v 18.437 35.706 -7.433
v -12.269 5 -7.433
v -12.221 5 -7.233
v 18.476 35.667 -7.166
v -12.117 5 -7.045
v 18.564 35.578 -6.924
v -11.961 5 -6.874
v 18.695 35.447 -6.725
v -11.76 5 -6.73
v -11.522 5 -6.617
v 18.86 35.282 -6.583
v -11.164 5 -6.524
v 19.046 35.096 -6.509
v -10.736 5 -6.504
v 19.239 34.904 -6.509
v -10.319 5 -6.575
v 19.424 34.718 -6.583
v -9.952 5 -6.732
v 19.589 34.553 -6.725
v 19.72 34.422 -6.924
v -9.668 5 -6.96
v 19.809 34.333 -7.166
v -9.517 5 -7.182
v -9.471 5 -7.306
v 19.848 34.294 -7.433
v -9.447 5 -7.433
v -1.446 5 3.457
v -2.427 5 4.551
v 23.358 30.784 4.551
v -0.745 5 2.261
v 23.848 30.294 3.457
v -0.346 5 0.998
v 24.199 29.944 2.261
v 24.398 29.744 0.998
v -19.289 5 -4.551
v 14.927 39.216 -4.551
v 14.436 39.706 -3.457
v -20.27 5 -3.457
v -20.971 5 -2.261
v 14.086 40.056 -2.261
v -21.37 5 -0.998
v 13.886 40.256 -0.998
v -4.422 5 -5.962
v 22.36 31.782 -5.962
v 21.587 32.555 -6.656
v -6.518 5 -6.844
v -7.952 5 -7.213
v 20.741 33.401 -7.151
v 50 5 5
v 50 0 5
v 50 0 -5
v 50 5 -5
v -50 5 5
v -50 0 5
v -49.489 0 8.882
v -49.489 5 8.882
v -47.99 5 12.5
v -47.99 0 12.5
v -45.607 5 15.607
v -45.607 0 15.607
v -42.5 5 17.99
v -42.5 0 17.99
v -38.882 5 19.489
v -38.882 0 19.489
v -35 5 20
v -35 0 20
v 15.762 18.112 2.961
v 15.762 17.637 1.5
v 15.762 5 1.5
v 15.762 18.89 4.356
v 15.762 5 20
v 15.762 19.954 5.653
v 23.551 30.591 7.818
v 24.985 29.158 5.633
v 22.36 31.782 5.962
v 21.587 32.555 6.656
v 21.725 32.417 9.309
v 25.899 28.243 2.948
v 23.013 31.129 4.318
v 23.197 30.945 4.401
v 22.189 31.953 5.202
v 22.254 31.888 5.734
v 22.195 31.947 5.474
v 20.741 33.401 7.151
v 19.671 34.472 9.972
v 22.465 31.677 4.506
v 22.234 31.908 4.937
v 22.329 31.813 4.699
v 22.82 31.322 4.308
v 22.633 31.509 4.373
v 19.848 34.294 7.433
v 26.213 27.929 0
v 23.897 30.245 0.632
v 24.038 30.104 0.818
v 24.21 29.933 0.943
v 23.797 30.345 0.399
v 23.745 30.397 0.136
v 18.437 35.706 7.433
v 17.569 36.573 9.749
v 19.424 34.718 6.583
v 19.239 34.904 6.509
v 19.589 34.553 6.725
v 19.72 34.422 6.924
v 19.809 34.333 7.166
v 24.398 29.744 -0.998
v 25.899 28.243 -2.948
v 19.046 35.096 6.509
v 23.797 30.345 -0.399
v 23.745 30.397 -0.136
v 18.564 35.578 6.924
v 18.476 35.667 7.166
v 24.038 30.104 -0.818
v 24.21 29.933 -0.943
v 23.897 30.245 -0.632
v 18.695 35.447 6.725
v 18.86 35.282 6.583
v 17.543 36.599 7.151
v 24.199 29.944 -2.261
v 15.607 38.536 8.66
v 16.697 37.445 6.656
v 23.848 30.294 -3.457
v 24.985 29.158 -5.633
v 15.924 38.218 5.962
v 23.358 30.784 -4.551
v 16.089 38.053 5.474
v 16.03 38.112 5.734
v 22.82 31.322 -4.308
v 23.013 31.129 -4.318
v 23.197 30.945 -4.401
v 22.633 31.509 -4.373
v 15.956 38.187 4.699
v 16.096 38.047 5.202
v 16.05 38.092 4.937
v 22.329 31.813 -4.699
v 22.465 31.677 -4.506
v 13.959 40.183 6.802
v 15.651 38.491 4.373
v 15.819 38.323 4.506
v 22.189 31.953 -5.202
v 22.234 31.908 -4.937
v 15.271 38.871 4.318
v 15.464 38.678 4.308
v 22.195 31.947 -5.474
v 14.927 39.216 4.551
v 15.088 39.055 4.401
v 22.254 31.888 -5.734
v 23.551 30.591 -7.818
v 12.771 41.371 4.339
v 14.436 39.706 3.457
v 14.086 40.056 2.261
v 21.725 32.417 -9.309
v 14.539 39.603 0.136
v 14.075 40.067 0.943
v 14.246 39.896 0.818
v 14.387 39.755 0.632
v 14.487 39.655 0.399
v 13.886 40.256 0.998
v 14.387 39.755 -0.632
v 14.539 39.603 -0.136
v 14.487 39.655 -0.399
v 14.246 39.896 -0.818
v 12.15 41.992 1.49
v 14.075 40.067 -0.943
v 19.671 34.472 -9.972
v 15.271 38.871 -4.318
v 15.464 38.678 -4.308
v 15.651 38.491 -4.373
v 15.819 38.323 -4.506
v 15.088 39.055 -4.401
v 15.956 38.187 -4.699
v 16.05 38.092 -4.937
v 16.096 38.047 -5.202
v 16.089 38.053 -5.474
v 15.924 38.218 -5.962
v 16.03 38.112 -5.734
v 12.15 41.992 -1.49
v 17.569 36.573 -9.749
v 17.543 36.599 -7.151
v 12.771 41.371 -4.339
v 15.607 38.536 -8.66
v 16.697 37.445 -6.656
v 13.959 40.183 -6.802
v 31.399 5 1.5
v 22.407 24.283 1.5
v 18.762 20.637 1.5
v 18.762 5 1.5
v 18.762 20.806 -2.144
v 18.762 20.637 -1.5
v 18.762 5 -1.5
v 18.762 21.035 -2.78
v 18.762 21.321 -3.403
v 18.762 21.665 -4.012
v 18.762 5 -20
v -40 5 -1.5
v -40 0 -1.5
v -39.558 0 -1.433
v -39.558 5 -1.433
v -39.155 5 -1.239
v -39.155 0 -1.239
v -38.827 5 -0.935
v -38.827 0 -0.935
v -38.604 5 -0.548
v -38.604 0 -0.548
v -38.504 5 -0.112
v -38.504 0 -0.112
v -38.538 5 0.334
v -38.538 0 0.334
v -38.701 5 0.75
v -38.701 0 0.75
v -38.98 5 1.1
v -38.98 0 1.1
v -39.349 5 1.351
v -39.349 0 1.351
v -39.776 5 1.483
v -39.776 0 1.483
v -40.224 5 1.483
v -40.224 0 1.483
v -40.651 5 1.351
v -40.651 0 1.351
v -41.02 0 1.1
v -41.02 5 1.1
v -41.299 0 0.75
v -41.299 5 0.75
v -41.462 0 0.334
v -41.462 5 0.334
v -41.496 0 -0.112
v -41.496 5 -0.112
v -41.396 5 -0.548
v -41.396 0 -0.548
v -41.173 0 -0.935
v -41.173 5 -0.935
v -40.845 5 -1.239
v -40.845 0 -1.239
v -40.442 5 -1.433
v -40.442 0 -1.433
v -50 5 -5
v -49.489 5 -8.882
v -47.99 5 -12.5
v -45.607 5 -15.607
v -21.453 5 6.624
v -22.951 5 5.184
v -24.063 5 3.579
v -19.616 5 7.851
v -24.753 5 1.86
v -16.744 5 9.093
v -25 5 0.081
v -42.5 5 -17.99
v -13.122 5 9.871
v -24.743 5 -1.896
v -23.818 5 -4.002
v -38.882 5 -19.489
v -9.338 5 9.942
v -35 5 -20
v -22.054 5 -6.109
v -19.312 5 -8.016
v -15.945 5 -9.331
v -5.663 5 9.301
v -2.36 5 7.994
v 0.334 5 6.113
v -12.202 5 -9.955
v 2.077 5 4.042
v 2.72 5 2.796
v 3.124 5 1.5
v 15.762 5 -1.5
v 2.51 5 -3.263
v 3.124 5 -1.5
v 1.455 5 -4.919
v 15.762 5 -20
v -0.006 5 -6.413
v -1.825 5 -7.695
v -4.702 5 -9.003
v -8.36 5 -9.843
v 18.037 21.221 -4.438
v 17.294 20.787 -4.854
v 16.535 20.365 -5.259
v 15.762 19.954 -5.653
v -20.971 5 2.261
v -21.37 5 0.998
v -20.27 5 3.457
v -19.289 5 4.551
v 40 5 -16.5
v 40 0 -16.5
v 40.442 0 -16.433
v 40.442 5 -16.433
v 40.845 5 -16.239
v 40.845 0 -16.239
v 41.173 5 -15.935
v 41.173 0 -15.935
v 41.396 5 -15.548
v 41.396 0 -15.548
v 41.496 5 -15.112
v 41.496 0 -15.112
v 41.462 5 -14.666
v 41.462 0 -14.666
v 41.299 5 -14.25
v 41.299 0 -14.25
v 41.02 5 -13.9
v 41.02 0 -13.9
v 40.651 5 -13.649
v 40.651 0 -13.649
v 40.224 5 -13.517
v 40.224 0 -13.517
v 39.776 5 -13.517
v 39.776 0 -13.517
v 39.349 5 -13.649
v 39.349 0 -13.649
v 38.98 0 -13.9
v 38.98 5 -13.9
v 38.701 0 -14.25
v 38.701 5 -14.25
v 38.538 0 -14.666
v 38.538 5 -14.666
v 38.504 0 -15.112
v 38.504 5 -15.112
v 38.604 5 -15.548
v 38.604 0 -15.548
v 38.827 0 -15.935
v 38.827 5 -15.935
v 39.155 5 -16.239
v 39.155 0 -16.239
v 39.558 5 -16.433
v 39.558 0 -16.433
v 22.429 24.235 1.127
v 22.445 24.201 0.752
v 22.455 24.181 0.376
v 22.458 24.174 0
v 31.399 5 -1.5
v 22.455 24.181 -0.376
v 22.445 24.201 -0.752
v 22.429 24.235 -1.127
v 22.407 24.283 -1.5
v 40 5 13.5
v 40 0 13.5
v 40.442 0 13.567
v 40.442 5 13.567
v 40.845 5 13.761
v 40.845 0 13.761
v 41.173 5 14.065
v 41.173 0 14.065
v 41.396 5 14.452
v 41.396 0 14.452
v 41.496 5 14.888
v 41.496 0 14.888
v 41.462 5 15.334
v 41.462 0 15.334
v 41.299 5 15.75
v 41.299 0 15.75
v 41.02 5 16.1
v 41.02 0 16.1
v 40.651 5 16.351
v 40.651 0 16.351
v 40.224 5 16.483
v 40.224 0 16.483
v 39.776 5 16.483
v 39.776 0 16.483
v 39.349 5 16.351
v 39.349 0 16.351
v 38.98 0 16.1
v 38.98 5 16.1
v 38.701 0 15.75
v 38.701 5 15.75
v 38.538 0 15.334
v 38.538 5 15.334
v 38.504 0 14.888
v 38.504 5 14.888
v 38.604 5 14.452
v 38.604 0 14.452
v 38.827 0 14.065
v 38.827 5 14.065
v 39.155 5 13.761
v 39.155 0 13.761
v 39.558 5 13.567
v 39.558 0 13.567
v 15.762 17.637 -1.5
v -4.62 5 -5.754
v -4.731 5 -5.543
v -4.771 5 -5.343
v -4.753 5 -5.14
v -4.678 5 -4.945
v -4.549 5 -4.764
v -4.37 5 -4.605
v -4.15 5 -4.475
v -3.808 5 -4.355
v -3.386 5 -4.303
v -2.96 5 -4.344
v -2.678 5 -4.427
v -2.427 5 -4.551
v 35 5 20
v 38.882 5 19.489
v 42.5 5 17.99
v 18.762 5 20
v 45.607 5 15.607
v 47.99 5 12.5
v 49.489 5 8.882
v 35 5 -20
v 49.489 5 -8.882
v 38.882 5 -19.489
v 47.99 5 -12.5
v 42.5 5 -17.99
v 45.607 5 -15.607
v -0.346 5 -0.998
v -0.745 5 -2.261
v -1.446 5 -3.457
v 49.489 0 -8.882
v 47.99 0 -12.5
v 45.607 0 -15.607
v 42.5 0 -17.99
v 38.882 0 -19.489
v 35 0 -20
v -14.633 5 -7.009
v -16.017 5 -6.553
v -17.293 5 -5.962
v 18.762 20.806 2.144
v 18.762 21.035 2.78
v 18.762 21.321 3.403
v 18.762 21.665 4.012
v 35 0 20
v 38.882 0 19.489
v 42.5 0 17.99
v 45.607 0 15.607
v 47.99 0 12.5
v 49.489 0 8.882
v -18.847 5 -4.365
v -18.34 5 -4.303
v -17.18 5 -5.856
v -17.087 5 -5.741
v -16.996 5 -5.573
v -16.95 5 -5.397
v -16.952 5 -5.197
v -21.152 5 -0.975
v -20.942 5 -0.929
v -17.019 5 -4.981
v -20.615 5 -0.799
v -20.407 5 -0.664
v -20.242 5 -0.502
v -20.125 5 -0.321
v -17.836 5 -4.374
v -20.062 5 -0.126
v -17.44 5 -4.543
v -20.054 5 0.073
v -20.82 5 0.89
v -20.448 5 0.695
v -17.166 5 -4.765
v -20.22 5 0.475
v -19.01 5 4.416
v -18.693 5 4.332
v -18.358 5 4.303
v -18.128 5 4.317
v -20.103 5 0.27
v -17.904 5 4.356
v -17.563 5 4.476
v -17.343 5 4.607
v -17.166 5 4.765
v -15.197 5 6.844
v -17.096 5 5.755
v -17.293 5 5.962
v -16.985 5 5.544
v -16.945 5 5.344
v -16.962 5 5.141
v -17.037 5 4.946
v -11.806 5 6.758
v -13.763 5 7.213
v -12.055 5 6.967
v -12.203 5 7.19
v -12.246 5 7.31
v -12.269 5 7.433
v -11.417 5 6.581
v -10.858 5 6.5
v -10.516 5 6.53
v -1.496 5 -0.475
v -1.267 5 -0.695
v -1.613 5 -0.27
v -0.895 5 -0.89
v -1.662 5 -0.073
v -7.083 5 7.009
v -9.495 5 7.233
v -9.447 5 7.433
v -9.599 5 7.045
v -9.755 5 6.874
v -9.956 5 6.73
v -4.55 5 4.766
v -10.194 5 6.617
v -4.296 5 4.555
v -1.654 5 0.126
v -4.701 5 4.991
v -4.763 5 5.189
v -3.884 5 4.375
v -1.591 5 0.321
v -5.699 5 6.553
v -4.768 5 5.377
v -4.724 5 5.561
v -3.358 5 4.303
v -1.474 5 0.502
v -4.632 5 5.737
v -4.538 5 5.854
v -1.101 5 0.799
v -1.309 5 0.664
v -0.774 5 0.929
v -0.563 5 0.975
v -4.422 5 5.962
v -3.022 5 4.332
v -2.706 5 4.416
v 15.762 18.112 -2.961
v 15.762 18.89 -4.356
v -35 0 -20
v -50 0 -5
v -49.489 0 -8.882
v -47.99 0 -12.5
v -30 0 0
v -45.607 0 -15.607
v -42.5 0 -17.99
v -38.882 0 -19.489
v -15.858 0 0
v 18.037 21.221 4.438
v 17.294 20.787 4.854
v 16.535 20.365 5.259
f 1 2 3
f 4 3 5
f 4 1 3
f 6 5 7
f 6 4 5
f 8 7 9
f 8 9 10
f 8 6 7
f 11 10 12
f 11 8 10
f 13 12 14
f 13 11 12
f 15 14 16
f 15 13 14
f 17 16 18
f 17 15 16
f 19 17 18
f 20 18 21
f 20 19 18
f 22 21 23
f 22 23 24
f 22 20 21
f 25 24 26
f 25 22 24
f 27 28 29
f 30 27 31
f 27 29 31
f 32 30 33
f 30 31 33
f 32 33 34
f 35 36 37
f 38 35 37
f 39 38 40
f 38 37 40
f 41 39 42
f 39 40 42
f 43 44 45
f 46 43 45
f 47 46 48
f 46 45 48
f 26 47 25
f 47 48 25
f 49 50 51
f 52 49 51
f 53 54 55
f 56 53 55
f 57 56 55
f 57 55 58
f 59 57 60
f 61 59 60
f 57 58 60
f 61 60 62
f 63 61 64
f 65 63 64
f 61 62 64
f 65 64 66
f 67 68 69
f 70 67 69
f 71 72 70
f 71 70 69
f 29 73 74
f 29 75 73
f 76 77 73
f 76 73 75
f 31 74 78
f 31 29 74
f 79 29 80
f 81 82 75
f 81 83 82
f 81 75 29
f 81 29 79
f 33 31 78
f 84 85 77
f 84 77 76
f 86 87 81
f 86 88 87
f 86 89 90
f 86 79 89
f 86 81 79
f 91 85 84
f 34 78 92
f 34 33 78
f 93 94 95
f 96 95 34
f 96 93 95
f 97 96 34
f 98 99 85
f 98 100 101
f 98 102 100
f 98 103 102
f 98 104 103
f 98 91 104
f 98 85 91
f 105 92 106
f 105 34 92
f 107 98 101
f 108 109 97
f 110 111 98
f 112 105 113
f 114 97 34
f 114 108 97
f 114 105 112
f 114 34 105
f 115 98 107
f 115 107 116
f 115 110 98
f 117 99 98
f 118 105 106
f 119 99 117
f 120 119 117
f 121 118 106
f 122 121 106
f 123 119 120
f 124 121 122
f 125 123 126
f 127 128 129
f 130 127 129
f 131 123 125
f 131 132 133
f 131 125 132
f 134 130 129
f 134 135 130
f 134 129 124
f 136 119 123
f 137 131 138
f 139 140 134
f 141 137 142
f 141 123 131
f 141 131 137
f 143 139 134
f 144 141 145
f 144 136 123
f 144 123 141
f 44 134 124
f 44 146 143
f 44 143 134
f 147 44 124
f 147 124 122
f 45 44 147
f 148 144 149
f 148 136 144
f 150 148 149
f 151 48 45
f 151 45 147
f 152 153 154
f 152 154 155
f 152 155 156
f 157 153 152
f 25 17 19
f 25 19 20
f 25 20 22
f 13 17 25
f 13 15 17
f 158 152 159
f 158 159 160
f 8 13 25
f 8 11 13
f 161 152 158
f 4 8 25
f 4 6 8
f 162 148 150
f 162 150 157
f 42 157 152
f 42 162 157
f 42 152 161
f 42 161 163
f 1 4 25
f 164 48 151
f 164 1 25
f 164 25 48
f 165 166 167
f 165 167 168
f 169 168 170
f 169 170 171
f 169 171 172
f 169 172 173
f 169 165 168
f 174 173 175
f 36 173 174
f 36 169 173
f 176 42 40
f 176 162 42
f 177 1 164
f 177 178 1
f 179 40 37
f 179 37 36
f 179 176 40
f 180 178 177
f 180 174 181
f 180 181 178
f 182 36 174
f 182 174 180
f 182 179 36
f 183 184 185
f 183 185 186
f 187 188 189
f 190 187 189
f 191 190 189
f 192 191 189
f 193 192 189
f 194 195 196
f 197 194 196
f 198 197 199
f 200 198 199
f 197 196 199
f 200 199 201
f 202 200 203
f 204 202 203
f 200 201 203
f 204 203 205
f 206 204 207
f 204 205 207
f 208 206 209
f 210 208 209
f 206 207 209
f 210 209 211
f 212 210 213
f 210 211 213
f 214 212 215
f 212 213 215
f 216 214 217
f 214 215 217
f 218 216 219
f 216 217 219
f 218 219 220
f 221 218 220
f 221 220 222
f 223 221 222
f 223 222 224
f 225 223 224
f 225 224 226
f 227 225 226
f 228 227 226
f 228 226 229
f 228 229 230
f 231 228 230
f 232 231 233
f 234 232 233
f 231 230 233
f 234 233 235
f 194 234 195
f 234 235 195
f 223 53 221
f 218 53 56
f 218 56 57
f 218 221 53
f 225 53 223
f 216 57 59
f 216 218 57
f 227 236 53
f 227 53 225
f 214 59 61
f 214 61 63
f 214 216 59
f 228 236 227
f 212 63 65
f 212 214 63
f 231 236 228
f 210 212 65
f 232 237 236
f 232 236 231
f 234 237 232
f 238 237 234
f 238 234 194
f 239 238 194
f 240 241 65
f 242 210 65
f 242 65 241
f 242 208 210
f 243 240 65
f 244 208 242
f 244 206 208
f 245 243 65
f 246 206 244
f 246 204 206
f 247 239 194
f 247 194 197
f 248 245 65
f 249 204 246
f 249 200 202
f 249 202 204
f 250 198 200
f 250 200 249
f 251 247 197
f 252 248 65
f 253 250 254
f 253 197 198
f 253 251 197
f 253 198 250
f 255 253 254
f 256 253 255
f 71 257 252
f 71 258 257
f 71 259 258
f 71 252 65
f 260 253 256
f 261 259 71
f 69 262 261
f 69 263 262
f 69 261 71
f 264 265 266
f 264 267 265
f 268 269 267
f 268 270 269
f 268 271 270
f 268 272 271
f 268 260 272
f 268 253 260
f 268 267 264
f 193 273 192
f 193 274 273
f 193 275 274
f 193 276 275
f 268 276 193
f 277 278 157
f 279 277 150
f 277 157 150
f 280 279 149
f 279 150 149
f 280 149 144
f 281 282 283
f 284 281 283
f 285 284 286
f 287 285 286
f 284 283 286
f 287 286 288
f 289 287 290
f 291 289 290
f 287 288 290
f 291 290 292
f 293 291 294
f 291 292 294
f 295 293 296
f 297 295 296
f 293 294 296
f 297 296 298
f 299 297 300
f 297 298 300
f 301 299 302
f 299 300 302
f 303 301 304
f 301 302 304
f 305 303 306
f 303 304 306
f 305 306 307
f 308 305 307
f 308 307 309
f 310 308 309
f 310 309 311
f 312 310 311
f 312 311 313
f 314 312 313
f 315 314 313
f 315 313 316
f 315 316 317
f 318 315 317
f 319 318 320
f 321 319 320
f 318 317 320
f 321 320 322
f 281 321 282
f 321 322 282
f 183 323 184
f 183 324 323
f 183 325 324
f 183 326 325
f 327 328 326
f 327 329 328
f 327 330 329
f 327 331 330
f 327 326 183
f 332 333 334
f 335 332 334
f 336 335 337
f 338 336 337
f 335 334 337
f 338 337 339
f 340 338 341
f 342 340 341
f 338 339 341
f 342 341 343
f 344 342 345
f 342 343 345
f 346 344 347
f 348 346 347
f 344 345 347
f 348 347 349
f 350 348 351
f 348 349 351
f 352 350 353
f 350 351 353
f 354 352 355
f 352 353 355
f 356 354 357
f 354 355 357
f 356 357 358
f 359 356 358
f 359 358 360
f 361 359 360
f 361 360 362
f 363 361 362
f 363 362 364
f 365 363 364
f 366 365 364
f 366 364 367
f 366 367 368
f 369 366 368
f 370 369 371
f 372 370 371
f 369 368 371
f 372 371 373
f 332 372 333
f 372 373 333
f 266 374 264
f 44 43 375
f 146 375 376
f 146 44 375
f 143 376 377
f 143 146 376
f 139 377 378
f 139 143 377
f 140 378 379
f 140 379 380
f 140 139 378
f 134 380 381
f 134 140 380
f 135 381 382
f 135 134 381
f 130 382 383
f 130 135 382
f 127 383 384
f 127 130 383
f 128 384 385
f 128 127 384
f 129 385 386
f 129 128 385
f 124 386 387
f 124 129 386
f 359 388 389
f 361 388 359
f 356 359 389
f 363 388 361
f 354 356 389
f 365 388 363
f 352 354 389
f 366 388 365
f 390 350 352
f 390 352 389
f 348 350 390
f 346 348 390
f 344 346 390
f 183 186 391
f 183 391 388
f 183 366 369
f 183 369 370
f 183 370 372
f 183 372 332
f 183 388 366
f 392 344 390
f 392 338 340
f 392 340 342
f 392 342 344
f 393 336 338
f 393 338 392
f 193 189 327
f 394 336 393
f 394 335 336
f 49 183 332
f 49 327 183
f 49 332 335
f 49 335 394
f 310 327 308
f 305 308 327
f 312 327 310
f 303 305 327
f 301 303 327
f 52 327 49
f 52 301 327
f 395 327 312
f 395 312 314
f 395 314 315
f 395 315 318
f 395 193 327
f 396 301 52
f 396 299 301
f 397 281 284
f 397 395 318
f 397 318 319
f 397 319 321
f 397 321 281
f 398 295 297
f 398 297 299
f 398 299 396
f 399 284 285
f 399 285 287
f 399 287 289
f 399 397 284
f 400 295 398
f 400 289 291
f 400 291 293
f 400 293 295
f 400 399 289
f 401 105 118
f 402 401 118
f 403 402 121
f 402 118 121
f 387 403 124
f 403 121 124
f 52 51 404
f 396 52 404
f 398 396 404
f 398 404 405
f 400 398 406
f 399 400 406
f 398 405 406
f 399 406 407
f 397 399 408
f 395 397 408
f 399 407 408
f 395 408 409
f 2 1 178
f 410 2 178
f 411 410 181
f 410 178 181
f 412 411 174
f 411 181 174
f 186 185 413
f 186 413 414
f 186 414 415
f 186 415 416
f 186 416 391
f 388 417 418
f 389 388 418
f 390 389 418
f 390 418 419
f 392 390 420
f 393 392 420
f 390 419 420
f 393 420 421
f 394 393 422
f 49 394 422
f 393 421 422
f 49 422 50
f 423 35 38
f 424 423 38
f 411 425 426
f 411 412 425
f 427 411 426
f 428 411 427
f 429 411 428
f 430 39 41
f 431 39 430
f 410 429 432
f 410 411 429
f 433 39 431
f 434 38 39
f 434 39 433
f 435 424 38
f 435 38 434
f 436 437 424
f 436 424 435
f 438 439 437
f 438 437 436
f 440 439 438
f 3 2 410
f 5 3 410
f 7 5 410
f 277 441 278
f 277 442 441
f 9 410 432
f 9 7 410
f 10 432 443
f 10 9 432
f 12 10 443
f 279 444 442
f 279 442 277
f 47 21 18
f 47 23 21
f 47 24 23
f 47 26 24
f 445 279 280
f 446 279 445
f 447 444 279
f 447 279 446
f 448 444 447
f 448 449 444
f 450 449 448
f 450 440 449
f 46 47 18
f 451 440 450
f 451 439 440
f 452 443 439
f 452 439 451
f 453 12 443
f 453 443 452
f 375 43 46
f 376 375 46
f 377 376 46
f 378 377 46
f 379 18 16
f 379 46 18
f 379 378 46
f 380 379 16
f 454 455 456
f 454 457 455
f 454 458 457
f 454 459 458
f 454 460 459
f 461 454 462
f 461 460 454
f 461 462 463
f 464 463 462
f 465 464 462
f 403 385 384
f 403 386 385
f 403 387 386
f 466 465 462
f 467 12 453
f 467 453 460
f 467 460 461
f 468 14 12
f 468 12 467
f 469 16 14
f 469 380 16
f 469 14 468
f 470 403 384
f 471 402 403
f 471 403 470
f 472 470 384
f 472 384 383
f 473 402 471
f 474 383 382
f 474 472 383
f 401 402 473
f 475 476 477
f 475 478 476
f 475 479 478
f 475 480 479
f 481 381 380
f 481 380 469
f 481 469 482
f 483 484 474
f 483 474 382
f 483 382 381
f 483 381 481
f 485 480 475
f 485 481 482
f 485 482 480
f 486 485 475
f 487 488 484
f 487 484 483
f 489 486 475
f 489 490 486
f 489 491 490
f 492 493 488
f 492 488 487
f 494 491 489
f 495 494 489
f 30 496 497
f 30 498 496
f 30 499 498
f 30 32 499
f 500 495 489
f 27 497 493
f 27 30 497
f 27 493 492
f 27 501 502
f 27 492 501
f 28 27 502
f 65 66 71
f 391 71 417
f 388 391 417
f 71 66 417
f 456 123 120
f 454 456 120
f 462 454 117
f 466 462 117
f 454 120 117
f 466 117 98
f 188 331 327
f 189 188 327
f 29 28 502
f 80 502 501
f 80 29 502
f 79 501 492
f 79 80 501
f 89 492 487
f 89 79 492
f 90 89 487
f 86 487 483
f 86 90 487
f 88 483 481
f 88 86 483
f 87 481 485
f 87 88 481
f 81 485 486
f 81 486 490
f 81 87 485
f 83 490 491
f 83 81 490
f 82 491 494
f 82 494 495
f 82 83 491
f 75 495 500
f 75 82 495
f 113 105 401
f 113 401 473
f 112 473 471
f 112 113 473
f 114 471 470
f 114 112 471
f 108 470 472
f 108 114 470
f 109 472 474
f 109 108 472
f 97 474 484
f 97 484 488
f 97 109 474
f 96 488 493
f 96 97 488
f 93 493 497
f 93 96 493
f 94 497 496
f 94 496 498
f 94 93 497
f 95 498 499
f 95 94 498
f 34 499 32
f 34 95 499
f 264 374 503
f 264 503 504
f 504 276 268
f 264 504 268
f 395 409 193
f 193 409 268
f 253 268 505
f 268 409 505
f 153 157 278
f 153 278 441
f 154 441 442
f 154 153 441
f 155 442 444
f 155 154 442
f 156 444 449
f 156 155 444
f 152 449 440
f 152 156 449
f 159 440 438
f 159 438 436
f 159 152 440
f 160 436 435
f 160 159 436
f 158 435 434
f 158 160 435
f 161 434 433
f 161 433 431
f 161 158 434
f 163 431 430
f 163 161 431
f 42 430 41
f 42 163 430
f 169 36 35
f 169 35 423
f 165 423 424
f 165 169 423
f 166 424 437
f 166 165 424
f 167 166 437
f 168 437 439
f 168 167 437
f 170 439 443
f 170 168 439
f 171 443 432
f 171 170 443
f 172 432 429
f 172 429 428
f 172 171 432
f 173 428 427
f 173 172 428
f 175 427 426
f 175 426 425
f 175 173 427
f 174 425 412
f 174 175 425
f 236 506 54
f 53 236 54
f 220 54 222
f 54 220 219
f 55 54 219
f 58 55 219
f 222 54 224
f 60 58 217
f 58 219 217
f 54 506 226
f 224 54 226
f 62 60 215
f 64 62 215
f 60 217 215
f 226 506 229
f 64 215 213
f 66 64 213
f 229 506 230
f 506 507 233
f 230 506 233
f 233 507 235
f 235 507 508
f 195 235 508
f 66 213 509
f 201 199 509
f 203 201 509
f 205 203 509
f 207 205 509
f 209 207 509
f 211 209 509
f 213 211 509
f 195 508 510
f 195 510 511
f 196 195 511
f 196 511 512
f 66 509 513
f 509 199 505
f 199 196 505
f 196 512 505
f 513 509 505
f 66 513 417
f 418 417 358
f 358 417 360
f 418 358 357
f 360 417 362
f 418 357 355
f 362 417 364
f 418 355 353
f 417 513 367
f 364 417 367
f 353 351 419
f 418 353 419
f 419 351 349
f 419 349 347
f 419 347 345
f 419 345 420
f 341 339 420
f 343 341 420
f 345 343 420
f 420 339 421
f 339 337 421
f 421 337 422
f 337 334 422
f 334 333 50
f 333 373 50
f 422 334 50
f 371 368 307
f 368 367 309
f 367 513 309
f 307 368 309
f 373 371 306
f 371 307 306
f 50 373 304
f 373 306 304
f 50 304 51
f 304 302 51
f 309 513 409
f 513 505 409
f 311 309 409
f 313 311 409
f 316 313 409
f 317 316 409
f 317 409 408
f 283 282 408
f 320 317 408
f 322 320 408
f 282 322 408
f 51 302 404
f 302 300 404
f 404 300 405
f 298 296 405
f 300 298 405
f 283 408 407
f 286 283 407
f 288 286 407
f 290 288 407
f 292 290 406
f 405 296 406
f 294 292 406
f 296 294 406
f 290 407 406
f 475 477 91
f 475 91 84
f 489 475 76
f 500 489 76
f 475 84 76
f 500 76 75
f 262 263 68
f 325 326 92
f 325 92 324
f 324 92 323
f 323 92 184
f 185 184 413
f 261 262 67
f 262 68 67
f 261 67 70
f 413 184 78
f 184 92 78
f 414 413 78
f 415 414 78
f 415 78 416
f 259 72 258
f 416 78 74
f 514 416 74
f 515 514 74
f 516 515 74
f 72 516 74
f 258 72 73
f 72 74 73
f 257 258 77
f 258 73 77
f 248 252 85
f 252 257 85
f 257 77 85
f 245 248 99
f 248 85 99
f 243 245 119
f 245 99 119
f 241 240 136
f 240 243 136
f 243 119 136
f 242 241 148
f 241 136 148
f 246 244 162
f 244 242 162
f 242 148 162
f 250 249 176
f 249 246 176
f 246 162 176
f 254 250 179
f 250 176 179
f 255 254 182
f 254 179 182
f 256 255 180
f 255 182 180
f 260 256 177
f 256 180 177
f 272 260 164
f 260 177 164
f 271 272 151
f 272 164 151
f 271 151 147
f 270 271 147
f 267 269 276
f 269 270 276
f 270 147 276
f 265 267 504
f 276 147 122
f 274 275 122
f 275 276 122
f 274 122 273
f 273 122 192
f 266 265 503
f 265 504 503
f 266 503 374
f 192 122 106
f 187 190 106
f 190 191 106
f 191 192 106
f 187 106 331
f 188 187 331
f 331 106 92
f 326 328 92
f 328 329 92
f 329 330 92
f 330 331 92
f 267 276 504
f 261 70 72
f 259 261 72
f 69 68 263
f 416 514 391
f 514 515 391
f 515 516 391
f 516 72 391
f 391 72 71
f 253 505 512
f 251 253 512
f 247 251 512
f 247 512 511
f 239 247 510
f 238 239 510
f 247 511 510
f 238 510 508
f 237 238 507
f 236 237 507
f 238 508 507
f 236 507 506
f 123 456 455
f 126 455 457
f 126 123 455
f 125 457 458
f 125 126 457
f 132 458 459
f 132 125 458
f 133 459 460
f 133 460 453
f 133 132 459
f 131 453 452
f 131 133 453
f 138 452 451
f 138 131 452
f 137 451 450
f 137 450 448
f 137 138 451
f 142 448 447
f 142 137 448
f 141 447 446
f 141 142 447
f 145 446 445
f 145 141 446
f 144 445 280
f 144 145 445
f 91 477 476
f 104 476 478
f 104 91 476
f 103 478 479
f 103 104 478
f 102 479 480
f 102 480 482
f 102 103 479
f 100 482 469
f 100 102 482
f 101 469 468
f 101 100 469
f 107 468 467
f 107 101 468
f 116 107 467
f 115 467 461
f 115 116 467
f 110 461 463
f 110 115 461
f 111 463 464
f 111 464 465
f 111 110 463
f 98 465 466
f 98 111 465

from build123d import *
from build123d.topology import SkipClean

# Parameters (mm, degrees)
BOSS_EXTRUDE1_DEPTH = 5
SKETCH3_W           = 36.405926788
SKETCH3_H           = 27.783470444
CUT_EXTRUDE1_DEPTH  = 36
CUT_EXTRUDE2_REACH  = 86.1
SKETCH4_R           = 7.5
BOSS_EXTRUDE2_REACH = 86.1
SKETCH5_R           = 1
RIB2_REACH          = 70.337
SKETCH6_WALL_W      = 155.225095754
SKETCH6_WALL_H      = 3
RIB3_REACH          = 83.817
SKETCH7_WALL_W      = 192.357197592
SKETCH7_WALL_H      = 3
RIB4_REACH          = 83.817
SKETCH9_WALL_W      = 192.357197592
SKETCH9_WALL_H      = 3
SKETCH10_R          = 1.5
CUT_EXTRUDE3_DEPTH  = 5


with BuildPart() as part:
    # Sketch1 → Boss-Extrude1 (new body)
    with BuildSketch(Plane(origin=(0, 0, 0), x_dir=(1, 0, 0), z_dir=(0, 1, 0))):
        with BuildLine():
            Line((35, 20), (-35, 20))
            ThreePointArc((-35, 20), (-45.606601718, 15.606601718), (-50, 5))
            Line((-50, 5), (-50, -5))
            ThreePointArc((-50, -5), (-45.606601718, -15.606601718), (-35, -20))
            Line((-35, -20), (35, -20))
            ThreePointArc((35, -20), (45.606601718, -15.606601718), (50, -5))
            Line((50, -5), (50, 5))
            ThreePointArc((50, 5), (45.606601718, 15.606601718), (35, 20))
        make_face()
    extrude(amount=BOSS_EXTRUDE1_DEPTH)

    # Sketch2 → Revolve2 (revolve)
    with SkipClean():  # the faces are left unmerged after this step: merging them gives an invalid solid
        with BuildSketch(Plane.XY, mode=Mode.PRIVATE) as revolve2_sk:
            Polygon((-30, 0), (12.071067812, 42.071067812), (19.142135624, 35), (-15.857864376, 0), align=None)
        revolve(revolve2_sk.sketch.rotate(Axis((19.142135624, 35, 0), (-0.7071067811865515, -0.7071067811865436, 0)), 180), axis=Axis((19.142135624, 35, 0), (-0.7071067811865515, -0.7071067811865436, 0)))

    # Sketch3 → Cut-Extrude1 (cut)
    with BuildSketch(Plane.XZ):
        with Locations((-14.157860418, 0)):
            Rectangle(SKETCH3_W, SKETCH3_H)
    extrude(amount=CUT_EXTRUDE1_DEPTH, mode=Mode.SUBTRACT)

    # Cut-Extrude2: up to this plane
    cut_extrude2_end = Plane(origin=(-35, 5, -5), z_dir=(0, 1, 0))
    # Sketch4 → Cut-Extrude2 (cut, up to the surface)
    with BuildSketch(Plane(origin=(27.071067812, 27.071067812, 0), x_dir=(0, 0, -1), z_dir=(0.7071067811865513, 0.7071067811865438, 0)), mode=Mode.PRIVATE) as cut_extrude2_sk1:
        with Locations(Location((0, 11.213203436, 0), (0, 0, 90))):
            Circle(SKETCH4_R)
    cut_extrude2_tool1 = split(extrude(cut_extrude2_sk1.sketch, amount=-CUT_EXTRUDE2_REACH, mode=Mode.PRIVATE), bisect_by=cut_extrude2_end, keep=Keep.BOTH, mode=Mode.PRIVATE)
    add(cut_extrude2_tool1.solids().sort_by_distance((19.142136, 35, 0))[0], mode=Mode.SUBTRACT)

    # Boss-Extrude2: up to this plane
    boss_extrude2_end = Plane(origin=(-35, 5, -5), z_dir=(0, 1, 0))
    # Sketch5 → Boss-Extrude2 (add, up to the surface)
    with BuildSketch(Plane(origin=(27.071067812, 27.071067812, 0), x_dir=(0, 0, -1), z_dir=(0.7071067811865513, 0.7071067811865438, 0)), mode=Mode.PRIVATE) as boss_extrude2_sk1:
        with Locations((7.5, 11.213203436)):
            Circle(SKETCH5_R)
    boss_extrude2_tool1 = split(extrude(boss_extrude2_sk1.sketch, amount=-BOSS_EXTRUDE2_REACH, mode=Mode.PRIVATE), bisect_by=boss_extrude2_end, keep=Keep.BOTH, mode=Mode.PRIVATE)
    add(boss_extrude2_tool1.solids().sort_by_distance((19.142136, 35, -7.5))[0])
    # Sketch5 → Boss-Extrude2 (add, up to the surface)
    with BuildSketch(Plane(origin=(27.071067812, 27.071067812, 0), x_dir=(0, 0, -1), z_dir=(0.7071067811865513, 0.7071067811865438, 0)), mode=Mode.PRIVATE) as boss_extrude2_sk2:
        with Locations((5.303300859, 5.909902577)):
            Circle(SKETCH5_R)
    boss_extrude2_tool2 = split(extrude(boss_extrude2_sk2.sketch, amount=-BOSS_EXTRUDE2_REACH, mode=Mode.PRIVATE), bisect_by=boss_extrude2_end, keep=Keep.BOTH, mode=Mode.PRIVATE)
    add(boss_extrude2_tool2.solids().sort_by_distance((22.892136, 31.25, -5.303301))[0])
    # Sketch5 → Boss-Extrude2 (add, up to the surface)
    with BuildSketch(Plane(origin=(27.071067812, 27.071067812, 0), x_dir=(0, 0, -1), z_dir=(0.7071067811865513, 0.7071067811865438, 0)), mode=Mode.PRIVATE) as boss_extrude2_sk3:
        with Locations((0, 3.713203436)):
            Circle(SKETCH5_R)
    boss_extrude2_tool3 = split(extrude(boss_extrude2_sk3.sketch, amount=-BOSS_EXTRUDE2_REACH, mode=Mode.PRIVATE), bisect_by=boss_extrude2_end, keep=Keep.BOTH, mode=Mode.PRIVATE)
    add(boss_extrude2_tool3.solids().sort_by_distance((24.445436, 29.696699, 0))[0])
    # Sketch5 → Boss-Extrude2 (add, up to the surface)
    with BuildSketch(Plane(origin=(27.071067812, 27.071067812, 0), x_dir=(0, 0, -1), z_dir=(0.7071067811865513, 0.7071067811865438, 0)), mode=Mode.PRIVATE) as boss_extrude2_sk4:
        with Locations((-5.303300859, 5.909902577)):
            Circle(SKETCH5_R)
    boss_extrude2_tool4 = split(extrude(boss_extrude2_sk4.sketch, amount=-BOSS_EXTRUDE2_REACH, mode=Mode.PRIVATE), bisect_by=boss_extrude2_end, keep=Keep.BOTH, mode=Mode.PRIVATE)
    add(boss_extrude2_tool4.solids().sort_by_distance((22.892136, 31.25, 5.303301))[0])
    # Sketch5 → Boss-Extrude2 (add, up to the surface)
    with BuildSketch(Plane(origin=(27.071067812, 27.071067812, 0), x_dir=(0, 0, -1), z_dir=(0.7071067811865513, 0.7071067811865438, 0)), mode=Mode.PRIVATE) as boss_extrude2_sk5:
        with Locations((-7.5, 11.213203436)):
            Circle(SKETCH5_R)
    boss_extrude2_tool5 = split(extrude(boss_extrude2_sk5.sketch, amount=-BOSS_EXTRUDE2_REACH, mode=Mode.PRIVATE), bisect_by=boss_extrude2_end, keep=Keep.BOTH, mode=Mode.PRIVATE)
    add(boss_extrude2_tool5.solids().sort_by_distance((19.142136, 35, 7.5))[0])
    # Sketch5 → Boss-Extrude2 (add, up to the surface)
    with BuildSketch(Plane(origin=(27.071067812, 27.071067812, 0), x_dir=(0, 0, -1), z_dir=(0.7071067811865513, 0.7071067811865438, 0)), mode=Mode.PRIVATE) as boss_extrude2_sk6:
        with Locations((-5.303300859, 16.516504294)):
            Circle(SKETCH5_R)
    boss_extrude2_tool6 = split(extrude(boss_extrude2_sk6.sketch, amount=-BOSS_EXTRUDE2_REACH, mode=Mode.PRIVATE), bisect_by=boss_extrude2_end, keep=Keep.BOTH, mode=Mode.PRIVATE)
    add(boss_extrude2_tool6.solids().sort_by_distance((15.392136, 38.75, 5.303301))[0])
    # Sketch5 → Boss-Extrude2 (add, up to the surface)
    with BuildSketch(Plane(origin=(27.071067812, 27.071067812, 0), x_dir=(0, 0, -1), z_dir=(0.7071067811865513, 0.7071067811865438, 0)), mode=Mode.PRIVATE) as boss_extrude2_sk7:
        with Locations((0, 18.713203436)):
            Circle(SKETCH5_R)
    boss_extrude2_tool7 = split(extrude(boss_extrude2_sk7.sketch, amount=-BOSS_EXTRUDE2_REACH, mode=Mode.PRIVATE), bisect_by=boss_extrude2_end, keep=Keep.BOTH, mode=Mode.PRIVATE)
    add(boss_extrude2_tool7.solids().sort_by_distance((13.838835, 40.303301, 0))[0])
    # Sketch5 → Boss-Extrude2 (add, up to the surface)
    with BuildSketch(Plane(origin=(27.071067812, 27.071067812, 0), x_dir=(0, 0, -1), z_dir=(0.7071067811865513, 0.7071067811865438, 0)), mode=Mode.PRIVATE) as boss_extrude2_sk8:
        with Locations((5.303300859, 16.516504294)):
            Circle(SKETCH5_R)
    boss_extrude2_tool8 = split(extrude(boss_extrude2_sk8.sketch, amount=-BOSS_EXTRUDE2_REACH, mode=Mode.PRIVATE), bisect_by=boss_extrude2_end, keep=Keep.BOTH, mode=Mode.PRIVATE)
    add(boss_extrude2_tool8.solids().sort_by_distance((15.392136, 38.75, -5.303301))[0])

    # Sketch6 wall → Rib2 (add, up to next)
    with BuildSketch(Plane(origin=(26.502692564, 15.5, 0), x_dir=(0.422618261725, -0.906307787044, 0), z_dir=(0.906307787044, 0.422618261725, 0)), mode=Mode.PRIVATE) as rib2_sk1:
        Rectangle(SKETCH6_WALL_W, SKETCH6_WALL_H)
    rib2_tool1 = extrude(rib2_sk1.sketch, amount=-RIB2_REACH, mode=Mode.PRIVATE) - part.part
    add(rib2_tool1.solids().sort_by_distance((26.502692564, 15.5, 0))[0])

    # Sketch7 wall → Rib3 (add, up to next)
    with BuildSketch(Plane(origin=(17.261595026, 14.641447257, 10.75), x_dir=(0, -0.721603754863, 0.69230630574), z_dir=(0, -0.69230630574, -0.721603754863)), mode=Mode.PRIVATE) as rib3_sk1:
        Rectangle(SKETCH7_WALL_W, SKETCH7_WALL_H)
    rib3_tool1 = extrude(rib3_sk1.sketch, amount=RIB3_REACH, mode=Mode.PRIVATE) - part.part
    add(rib3_tool1.solids().sort_by_distance((17.261595026, 14.641447257, 10.75))[0])

    # Sketch9 wall → Rib4 (add, up to next)
    with BuildSketch(Plane(origin=(17.261595026, 14.641447257, -10.75), x_dir=(0, -0.721603754863, -0.69230630574), z_dir=(0, 0.69230630574, -0.721603754863)), mode=Mode.PRIVATE) as rib4_sk1:
        Rectangle(SKETCH9_WALL_W, SKETCH9_WALL_H)
    rib4_tool1 = extrude(rib4_sk1.sketch, amount=-RIB4_REACH, mode=Mode.PRIVATE) - part.part
    add(rib4_tool1.solids().sort_by_distance((17.261595026, 14.641447257, -10.75))[0])

    # Sketch10 → Cut-Extrude3 (cut)
    with BuildSketch(Plane.XZ):
        with Locations(Location((-40, 0, 0), (0, 0, 270))):
            Circle(SKETCH10_R)
        with Locations(Location((40, 15, 0), (0, 0, 270))):
            Circle(SKETCH10_R)
        with Locations(Location((40, -15, 0), (0, 0, 270))):
            Circle(SKETCH10_R)
    extrude(amount=-CUT_EXTRUDE3_DEPTH, mode=Mode.SUBTRACT)


solid = part.part
